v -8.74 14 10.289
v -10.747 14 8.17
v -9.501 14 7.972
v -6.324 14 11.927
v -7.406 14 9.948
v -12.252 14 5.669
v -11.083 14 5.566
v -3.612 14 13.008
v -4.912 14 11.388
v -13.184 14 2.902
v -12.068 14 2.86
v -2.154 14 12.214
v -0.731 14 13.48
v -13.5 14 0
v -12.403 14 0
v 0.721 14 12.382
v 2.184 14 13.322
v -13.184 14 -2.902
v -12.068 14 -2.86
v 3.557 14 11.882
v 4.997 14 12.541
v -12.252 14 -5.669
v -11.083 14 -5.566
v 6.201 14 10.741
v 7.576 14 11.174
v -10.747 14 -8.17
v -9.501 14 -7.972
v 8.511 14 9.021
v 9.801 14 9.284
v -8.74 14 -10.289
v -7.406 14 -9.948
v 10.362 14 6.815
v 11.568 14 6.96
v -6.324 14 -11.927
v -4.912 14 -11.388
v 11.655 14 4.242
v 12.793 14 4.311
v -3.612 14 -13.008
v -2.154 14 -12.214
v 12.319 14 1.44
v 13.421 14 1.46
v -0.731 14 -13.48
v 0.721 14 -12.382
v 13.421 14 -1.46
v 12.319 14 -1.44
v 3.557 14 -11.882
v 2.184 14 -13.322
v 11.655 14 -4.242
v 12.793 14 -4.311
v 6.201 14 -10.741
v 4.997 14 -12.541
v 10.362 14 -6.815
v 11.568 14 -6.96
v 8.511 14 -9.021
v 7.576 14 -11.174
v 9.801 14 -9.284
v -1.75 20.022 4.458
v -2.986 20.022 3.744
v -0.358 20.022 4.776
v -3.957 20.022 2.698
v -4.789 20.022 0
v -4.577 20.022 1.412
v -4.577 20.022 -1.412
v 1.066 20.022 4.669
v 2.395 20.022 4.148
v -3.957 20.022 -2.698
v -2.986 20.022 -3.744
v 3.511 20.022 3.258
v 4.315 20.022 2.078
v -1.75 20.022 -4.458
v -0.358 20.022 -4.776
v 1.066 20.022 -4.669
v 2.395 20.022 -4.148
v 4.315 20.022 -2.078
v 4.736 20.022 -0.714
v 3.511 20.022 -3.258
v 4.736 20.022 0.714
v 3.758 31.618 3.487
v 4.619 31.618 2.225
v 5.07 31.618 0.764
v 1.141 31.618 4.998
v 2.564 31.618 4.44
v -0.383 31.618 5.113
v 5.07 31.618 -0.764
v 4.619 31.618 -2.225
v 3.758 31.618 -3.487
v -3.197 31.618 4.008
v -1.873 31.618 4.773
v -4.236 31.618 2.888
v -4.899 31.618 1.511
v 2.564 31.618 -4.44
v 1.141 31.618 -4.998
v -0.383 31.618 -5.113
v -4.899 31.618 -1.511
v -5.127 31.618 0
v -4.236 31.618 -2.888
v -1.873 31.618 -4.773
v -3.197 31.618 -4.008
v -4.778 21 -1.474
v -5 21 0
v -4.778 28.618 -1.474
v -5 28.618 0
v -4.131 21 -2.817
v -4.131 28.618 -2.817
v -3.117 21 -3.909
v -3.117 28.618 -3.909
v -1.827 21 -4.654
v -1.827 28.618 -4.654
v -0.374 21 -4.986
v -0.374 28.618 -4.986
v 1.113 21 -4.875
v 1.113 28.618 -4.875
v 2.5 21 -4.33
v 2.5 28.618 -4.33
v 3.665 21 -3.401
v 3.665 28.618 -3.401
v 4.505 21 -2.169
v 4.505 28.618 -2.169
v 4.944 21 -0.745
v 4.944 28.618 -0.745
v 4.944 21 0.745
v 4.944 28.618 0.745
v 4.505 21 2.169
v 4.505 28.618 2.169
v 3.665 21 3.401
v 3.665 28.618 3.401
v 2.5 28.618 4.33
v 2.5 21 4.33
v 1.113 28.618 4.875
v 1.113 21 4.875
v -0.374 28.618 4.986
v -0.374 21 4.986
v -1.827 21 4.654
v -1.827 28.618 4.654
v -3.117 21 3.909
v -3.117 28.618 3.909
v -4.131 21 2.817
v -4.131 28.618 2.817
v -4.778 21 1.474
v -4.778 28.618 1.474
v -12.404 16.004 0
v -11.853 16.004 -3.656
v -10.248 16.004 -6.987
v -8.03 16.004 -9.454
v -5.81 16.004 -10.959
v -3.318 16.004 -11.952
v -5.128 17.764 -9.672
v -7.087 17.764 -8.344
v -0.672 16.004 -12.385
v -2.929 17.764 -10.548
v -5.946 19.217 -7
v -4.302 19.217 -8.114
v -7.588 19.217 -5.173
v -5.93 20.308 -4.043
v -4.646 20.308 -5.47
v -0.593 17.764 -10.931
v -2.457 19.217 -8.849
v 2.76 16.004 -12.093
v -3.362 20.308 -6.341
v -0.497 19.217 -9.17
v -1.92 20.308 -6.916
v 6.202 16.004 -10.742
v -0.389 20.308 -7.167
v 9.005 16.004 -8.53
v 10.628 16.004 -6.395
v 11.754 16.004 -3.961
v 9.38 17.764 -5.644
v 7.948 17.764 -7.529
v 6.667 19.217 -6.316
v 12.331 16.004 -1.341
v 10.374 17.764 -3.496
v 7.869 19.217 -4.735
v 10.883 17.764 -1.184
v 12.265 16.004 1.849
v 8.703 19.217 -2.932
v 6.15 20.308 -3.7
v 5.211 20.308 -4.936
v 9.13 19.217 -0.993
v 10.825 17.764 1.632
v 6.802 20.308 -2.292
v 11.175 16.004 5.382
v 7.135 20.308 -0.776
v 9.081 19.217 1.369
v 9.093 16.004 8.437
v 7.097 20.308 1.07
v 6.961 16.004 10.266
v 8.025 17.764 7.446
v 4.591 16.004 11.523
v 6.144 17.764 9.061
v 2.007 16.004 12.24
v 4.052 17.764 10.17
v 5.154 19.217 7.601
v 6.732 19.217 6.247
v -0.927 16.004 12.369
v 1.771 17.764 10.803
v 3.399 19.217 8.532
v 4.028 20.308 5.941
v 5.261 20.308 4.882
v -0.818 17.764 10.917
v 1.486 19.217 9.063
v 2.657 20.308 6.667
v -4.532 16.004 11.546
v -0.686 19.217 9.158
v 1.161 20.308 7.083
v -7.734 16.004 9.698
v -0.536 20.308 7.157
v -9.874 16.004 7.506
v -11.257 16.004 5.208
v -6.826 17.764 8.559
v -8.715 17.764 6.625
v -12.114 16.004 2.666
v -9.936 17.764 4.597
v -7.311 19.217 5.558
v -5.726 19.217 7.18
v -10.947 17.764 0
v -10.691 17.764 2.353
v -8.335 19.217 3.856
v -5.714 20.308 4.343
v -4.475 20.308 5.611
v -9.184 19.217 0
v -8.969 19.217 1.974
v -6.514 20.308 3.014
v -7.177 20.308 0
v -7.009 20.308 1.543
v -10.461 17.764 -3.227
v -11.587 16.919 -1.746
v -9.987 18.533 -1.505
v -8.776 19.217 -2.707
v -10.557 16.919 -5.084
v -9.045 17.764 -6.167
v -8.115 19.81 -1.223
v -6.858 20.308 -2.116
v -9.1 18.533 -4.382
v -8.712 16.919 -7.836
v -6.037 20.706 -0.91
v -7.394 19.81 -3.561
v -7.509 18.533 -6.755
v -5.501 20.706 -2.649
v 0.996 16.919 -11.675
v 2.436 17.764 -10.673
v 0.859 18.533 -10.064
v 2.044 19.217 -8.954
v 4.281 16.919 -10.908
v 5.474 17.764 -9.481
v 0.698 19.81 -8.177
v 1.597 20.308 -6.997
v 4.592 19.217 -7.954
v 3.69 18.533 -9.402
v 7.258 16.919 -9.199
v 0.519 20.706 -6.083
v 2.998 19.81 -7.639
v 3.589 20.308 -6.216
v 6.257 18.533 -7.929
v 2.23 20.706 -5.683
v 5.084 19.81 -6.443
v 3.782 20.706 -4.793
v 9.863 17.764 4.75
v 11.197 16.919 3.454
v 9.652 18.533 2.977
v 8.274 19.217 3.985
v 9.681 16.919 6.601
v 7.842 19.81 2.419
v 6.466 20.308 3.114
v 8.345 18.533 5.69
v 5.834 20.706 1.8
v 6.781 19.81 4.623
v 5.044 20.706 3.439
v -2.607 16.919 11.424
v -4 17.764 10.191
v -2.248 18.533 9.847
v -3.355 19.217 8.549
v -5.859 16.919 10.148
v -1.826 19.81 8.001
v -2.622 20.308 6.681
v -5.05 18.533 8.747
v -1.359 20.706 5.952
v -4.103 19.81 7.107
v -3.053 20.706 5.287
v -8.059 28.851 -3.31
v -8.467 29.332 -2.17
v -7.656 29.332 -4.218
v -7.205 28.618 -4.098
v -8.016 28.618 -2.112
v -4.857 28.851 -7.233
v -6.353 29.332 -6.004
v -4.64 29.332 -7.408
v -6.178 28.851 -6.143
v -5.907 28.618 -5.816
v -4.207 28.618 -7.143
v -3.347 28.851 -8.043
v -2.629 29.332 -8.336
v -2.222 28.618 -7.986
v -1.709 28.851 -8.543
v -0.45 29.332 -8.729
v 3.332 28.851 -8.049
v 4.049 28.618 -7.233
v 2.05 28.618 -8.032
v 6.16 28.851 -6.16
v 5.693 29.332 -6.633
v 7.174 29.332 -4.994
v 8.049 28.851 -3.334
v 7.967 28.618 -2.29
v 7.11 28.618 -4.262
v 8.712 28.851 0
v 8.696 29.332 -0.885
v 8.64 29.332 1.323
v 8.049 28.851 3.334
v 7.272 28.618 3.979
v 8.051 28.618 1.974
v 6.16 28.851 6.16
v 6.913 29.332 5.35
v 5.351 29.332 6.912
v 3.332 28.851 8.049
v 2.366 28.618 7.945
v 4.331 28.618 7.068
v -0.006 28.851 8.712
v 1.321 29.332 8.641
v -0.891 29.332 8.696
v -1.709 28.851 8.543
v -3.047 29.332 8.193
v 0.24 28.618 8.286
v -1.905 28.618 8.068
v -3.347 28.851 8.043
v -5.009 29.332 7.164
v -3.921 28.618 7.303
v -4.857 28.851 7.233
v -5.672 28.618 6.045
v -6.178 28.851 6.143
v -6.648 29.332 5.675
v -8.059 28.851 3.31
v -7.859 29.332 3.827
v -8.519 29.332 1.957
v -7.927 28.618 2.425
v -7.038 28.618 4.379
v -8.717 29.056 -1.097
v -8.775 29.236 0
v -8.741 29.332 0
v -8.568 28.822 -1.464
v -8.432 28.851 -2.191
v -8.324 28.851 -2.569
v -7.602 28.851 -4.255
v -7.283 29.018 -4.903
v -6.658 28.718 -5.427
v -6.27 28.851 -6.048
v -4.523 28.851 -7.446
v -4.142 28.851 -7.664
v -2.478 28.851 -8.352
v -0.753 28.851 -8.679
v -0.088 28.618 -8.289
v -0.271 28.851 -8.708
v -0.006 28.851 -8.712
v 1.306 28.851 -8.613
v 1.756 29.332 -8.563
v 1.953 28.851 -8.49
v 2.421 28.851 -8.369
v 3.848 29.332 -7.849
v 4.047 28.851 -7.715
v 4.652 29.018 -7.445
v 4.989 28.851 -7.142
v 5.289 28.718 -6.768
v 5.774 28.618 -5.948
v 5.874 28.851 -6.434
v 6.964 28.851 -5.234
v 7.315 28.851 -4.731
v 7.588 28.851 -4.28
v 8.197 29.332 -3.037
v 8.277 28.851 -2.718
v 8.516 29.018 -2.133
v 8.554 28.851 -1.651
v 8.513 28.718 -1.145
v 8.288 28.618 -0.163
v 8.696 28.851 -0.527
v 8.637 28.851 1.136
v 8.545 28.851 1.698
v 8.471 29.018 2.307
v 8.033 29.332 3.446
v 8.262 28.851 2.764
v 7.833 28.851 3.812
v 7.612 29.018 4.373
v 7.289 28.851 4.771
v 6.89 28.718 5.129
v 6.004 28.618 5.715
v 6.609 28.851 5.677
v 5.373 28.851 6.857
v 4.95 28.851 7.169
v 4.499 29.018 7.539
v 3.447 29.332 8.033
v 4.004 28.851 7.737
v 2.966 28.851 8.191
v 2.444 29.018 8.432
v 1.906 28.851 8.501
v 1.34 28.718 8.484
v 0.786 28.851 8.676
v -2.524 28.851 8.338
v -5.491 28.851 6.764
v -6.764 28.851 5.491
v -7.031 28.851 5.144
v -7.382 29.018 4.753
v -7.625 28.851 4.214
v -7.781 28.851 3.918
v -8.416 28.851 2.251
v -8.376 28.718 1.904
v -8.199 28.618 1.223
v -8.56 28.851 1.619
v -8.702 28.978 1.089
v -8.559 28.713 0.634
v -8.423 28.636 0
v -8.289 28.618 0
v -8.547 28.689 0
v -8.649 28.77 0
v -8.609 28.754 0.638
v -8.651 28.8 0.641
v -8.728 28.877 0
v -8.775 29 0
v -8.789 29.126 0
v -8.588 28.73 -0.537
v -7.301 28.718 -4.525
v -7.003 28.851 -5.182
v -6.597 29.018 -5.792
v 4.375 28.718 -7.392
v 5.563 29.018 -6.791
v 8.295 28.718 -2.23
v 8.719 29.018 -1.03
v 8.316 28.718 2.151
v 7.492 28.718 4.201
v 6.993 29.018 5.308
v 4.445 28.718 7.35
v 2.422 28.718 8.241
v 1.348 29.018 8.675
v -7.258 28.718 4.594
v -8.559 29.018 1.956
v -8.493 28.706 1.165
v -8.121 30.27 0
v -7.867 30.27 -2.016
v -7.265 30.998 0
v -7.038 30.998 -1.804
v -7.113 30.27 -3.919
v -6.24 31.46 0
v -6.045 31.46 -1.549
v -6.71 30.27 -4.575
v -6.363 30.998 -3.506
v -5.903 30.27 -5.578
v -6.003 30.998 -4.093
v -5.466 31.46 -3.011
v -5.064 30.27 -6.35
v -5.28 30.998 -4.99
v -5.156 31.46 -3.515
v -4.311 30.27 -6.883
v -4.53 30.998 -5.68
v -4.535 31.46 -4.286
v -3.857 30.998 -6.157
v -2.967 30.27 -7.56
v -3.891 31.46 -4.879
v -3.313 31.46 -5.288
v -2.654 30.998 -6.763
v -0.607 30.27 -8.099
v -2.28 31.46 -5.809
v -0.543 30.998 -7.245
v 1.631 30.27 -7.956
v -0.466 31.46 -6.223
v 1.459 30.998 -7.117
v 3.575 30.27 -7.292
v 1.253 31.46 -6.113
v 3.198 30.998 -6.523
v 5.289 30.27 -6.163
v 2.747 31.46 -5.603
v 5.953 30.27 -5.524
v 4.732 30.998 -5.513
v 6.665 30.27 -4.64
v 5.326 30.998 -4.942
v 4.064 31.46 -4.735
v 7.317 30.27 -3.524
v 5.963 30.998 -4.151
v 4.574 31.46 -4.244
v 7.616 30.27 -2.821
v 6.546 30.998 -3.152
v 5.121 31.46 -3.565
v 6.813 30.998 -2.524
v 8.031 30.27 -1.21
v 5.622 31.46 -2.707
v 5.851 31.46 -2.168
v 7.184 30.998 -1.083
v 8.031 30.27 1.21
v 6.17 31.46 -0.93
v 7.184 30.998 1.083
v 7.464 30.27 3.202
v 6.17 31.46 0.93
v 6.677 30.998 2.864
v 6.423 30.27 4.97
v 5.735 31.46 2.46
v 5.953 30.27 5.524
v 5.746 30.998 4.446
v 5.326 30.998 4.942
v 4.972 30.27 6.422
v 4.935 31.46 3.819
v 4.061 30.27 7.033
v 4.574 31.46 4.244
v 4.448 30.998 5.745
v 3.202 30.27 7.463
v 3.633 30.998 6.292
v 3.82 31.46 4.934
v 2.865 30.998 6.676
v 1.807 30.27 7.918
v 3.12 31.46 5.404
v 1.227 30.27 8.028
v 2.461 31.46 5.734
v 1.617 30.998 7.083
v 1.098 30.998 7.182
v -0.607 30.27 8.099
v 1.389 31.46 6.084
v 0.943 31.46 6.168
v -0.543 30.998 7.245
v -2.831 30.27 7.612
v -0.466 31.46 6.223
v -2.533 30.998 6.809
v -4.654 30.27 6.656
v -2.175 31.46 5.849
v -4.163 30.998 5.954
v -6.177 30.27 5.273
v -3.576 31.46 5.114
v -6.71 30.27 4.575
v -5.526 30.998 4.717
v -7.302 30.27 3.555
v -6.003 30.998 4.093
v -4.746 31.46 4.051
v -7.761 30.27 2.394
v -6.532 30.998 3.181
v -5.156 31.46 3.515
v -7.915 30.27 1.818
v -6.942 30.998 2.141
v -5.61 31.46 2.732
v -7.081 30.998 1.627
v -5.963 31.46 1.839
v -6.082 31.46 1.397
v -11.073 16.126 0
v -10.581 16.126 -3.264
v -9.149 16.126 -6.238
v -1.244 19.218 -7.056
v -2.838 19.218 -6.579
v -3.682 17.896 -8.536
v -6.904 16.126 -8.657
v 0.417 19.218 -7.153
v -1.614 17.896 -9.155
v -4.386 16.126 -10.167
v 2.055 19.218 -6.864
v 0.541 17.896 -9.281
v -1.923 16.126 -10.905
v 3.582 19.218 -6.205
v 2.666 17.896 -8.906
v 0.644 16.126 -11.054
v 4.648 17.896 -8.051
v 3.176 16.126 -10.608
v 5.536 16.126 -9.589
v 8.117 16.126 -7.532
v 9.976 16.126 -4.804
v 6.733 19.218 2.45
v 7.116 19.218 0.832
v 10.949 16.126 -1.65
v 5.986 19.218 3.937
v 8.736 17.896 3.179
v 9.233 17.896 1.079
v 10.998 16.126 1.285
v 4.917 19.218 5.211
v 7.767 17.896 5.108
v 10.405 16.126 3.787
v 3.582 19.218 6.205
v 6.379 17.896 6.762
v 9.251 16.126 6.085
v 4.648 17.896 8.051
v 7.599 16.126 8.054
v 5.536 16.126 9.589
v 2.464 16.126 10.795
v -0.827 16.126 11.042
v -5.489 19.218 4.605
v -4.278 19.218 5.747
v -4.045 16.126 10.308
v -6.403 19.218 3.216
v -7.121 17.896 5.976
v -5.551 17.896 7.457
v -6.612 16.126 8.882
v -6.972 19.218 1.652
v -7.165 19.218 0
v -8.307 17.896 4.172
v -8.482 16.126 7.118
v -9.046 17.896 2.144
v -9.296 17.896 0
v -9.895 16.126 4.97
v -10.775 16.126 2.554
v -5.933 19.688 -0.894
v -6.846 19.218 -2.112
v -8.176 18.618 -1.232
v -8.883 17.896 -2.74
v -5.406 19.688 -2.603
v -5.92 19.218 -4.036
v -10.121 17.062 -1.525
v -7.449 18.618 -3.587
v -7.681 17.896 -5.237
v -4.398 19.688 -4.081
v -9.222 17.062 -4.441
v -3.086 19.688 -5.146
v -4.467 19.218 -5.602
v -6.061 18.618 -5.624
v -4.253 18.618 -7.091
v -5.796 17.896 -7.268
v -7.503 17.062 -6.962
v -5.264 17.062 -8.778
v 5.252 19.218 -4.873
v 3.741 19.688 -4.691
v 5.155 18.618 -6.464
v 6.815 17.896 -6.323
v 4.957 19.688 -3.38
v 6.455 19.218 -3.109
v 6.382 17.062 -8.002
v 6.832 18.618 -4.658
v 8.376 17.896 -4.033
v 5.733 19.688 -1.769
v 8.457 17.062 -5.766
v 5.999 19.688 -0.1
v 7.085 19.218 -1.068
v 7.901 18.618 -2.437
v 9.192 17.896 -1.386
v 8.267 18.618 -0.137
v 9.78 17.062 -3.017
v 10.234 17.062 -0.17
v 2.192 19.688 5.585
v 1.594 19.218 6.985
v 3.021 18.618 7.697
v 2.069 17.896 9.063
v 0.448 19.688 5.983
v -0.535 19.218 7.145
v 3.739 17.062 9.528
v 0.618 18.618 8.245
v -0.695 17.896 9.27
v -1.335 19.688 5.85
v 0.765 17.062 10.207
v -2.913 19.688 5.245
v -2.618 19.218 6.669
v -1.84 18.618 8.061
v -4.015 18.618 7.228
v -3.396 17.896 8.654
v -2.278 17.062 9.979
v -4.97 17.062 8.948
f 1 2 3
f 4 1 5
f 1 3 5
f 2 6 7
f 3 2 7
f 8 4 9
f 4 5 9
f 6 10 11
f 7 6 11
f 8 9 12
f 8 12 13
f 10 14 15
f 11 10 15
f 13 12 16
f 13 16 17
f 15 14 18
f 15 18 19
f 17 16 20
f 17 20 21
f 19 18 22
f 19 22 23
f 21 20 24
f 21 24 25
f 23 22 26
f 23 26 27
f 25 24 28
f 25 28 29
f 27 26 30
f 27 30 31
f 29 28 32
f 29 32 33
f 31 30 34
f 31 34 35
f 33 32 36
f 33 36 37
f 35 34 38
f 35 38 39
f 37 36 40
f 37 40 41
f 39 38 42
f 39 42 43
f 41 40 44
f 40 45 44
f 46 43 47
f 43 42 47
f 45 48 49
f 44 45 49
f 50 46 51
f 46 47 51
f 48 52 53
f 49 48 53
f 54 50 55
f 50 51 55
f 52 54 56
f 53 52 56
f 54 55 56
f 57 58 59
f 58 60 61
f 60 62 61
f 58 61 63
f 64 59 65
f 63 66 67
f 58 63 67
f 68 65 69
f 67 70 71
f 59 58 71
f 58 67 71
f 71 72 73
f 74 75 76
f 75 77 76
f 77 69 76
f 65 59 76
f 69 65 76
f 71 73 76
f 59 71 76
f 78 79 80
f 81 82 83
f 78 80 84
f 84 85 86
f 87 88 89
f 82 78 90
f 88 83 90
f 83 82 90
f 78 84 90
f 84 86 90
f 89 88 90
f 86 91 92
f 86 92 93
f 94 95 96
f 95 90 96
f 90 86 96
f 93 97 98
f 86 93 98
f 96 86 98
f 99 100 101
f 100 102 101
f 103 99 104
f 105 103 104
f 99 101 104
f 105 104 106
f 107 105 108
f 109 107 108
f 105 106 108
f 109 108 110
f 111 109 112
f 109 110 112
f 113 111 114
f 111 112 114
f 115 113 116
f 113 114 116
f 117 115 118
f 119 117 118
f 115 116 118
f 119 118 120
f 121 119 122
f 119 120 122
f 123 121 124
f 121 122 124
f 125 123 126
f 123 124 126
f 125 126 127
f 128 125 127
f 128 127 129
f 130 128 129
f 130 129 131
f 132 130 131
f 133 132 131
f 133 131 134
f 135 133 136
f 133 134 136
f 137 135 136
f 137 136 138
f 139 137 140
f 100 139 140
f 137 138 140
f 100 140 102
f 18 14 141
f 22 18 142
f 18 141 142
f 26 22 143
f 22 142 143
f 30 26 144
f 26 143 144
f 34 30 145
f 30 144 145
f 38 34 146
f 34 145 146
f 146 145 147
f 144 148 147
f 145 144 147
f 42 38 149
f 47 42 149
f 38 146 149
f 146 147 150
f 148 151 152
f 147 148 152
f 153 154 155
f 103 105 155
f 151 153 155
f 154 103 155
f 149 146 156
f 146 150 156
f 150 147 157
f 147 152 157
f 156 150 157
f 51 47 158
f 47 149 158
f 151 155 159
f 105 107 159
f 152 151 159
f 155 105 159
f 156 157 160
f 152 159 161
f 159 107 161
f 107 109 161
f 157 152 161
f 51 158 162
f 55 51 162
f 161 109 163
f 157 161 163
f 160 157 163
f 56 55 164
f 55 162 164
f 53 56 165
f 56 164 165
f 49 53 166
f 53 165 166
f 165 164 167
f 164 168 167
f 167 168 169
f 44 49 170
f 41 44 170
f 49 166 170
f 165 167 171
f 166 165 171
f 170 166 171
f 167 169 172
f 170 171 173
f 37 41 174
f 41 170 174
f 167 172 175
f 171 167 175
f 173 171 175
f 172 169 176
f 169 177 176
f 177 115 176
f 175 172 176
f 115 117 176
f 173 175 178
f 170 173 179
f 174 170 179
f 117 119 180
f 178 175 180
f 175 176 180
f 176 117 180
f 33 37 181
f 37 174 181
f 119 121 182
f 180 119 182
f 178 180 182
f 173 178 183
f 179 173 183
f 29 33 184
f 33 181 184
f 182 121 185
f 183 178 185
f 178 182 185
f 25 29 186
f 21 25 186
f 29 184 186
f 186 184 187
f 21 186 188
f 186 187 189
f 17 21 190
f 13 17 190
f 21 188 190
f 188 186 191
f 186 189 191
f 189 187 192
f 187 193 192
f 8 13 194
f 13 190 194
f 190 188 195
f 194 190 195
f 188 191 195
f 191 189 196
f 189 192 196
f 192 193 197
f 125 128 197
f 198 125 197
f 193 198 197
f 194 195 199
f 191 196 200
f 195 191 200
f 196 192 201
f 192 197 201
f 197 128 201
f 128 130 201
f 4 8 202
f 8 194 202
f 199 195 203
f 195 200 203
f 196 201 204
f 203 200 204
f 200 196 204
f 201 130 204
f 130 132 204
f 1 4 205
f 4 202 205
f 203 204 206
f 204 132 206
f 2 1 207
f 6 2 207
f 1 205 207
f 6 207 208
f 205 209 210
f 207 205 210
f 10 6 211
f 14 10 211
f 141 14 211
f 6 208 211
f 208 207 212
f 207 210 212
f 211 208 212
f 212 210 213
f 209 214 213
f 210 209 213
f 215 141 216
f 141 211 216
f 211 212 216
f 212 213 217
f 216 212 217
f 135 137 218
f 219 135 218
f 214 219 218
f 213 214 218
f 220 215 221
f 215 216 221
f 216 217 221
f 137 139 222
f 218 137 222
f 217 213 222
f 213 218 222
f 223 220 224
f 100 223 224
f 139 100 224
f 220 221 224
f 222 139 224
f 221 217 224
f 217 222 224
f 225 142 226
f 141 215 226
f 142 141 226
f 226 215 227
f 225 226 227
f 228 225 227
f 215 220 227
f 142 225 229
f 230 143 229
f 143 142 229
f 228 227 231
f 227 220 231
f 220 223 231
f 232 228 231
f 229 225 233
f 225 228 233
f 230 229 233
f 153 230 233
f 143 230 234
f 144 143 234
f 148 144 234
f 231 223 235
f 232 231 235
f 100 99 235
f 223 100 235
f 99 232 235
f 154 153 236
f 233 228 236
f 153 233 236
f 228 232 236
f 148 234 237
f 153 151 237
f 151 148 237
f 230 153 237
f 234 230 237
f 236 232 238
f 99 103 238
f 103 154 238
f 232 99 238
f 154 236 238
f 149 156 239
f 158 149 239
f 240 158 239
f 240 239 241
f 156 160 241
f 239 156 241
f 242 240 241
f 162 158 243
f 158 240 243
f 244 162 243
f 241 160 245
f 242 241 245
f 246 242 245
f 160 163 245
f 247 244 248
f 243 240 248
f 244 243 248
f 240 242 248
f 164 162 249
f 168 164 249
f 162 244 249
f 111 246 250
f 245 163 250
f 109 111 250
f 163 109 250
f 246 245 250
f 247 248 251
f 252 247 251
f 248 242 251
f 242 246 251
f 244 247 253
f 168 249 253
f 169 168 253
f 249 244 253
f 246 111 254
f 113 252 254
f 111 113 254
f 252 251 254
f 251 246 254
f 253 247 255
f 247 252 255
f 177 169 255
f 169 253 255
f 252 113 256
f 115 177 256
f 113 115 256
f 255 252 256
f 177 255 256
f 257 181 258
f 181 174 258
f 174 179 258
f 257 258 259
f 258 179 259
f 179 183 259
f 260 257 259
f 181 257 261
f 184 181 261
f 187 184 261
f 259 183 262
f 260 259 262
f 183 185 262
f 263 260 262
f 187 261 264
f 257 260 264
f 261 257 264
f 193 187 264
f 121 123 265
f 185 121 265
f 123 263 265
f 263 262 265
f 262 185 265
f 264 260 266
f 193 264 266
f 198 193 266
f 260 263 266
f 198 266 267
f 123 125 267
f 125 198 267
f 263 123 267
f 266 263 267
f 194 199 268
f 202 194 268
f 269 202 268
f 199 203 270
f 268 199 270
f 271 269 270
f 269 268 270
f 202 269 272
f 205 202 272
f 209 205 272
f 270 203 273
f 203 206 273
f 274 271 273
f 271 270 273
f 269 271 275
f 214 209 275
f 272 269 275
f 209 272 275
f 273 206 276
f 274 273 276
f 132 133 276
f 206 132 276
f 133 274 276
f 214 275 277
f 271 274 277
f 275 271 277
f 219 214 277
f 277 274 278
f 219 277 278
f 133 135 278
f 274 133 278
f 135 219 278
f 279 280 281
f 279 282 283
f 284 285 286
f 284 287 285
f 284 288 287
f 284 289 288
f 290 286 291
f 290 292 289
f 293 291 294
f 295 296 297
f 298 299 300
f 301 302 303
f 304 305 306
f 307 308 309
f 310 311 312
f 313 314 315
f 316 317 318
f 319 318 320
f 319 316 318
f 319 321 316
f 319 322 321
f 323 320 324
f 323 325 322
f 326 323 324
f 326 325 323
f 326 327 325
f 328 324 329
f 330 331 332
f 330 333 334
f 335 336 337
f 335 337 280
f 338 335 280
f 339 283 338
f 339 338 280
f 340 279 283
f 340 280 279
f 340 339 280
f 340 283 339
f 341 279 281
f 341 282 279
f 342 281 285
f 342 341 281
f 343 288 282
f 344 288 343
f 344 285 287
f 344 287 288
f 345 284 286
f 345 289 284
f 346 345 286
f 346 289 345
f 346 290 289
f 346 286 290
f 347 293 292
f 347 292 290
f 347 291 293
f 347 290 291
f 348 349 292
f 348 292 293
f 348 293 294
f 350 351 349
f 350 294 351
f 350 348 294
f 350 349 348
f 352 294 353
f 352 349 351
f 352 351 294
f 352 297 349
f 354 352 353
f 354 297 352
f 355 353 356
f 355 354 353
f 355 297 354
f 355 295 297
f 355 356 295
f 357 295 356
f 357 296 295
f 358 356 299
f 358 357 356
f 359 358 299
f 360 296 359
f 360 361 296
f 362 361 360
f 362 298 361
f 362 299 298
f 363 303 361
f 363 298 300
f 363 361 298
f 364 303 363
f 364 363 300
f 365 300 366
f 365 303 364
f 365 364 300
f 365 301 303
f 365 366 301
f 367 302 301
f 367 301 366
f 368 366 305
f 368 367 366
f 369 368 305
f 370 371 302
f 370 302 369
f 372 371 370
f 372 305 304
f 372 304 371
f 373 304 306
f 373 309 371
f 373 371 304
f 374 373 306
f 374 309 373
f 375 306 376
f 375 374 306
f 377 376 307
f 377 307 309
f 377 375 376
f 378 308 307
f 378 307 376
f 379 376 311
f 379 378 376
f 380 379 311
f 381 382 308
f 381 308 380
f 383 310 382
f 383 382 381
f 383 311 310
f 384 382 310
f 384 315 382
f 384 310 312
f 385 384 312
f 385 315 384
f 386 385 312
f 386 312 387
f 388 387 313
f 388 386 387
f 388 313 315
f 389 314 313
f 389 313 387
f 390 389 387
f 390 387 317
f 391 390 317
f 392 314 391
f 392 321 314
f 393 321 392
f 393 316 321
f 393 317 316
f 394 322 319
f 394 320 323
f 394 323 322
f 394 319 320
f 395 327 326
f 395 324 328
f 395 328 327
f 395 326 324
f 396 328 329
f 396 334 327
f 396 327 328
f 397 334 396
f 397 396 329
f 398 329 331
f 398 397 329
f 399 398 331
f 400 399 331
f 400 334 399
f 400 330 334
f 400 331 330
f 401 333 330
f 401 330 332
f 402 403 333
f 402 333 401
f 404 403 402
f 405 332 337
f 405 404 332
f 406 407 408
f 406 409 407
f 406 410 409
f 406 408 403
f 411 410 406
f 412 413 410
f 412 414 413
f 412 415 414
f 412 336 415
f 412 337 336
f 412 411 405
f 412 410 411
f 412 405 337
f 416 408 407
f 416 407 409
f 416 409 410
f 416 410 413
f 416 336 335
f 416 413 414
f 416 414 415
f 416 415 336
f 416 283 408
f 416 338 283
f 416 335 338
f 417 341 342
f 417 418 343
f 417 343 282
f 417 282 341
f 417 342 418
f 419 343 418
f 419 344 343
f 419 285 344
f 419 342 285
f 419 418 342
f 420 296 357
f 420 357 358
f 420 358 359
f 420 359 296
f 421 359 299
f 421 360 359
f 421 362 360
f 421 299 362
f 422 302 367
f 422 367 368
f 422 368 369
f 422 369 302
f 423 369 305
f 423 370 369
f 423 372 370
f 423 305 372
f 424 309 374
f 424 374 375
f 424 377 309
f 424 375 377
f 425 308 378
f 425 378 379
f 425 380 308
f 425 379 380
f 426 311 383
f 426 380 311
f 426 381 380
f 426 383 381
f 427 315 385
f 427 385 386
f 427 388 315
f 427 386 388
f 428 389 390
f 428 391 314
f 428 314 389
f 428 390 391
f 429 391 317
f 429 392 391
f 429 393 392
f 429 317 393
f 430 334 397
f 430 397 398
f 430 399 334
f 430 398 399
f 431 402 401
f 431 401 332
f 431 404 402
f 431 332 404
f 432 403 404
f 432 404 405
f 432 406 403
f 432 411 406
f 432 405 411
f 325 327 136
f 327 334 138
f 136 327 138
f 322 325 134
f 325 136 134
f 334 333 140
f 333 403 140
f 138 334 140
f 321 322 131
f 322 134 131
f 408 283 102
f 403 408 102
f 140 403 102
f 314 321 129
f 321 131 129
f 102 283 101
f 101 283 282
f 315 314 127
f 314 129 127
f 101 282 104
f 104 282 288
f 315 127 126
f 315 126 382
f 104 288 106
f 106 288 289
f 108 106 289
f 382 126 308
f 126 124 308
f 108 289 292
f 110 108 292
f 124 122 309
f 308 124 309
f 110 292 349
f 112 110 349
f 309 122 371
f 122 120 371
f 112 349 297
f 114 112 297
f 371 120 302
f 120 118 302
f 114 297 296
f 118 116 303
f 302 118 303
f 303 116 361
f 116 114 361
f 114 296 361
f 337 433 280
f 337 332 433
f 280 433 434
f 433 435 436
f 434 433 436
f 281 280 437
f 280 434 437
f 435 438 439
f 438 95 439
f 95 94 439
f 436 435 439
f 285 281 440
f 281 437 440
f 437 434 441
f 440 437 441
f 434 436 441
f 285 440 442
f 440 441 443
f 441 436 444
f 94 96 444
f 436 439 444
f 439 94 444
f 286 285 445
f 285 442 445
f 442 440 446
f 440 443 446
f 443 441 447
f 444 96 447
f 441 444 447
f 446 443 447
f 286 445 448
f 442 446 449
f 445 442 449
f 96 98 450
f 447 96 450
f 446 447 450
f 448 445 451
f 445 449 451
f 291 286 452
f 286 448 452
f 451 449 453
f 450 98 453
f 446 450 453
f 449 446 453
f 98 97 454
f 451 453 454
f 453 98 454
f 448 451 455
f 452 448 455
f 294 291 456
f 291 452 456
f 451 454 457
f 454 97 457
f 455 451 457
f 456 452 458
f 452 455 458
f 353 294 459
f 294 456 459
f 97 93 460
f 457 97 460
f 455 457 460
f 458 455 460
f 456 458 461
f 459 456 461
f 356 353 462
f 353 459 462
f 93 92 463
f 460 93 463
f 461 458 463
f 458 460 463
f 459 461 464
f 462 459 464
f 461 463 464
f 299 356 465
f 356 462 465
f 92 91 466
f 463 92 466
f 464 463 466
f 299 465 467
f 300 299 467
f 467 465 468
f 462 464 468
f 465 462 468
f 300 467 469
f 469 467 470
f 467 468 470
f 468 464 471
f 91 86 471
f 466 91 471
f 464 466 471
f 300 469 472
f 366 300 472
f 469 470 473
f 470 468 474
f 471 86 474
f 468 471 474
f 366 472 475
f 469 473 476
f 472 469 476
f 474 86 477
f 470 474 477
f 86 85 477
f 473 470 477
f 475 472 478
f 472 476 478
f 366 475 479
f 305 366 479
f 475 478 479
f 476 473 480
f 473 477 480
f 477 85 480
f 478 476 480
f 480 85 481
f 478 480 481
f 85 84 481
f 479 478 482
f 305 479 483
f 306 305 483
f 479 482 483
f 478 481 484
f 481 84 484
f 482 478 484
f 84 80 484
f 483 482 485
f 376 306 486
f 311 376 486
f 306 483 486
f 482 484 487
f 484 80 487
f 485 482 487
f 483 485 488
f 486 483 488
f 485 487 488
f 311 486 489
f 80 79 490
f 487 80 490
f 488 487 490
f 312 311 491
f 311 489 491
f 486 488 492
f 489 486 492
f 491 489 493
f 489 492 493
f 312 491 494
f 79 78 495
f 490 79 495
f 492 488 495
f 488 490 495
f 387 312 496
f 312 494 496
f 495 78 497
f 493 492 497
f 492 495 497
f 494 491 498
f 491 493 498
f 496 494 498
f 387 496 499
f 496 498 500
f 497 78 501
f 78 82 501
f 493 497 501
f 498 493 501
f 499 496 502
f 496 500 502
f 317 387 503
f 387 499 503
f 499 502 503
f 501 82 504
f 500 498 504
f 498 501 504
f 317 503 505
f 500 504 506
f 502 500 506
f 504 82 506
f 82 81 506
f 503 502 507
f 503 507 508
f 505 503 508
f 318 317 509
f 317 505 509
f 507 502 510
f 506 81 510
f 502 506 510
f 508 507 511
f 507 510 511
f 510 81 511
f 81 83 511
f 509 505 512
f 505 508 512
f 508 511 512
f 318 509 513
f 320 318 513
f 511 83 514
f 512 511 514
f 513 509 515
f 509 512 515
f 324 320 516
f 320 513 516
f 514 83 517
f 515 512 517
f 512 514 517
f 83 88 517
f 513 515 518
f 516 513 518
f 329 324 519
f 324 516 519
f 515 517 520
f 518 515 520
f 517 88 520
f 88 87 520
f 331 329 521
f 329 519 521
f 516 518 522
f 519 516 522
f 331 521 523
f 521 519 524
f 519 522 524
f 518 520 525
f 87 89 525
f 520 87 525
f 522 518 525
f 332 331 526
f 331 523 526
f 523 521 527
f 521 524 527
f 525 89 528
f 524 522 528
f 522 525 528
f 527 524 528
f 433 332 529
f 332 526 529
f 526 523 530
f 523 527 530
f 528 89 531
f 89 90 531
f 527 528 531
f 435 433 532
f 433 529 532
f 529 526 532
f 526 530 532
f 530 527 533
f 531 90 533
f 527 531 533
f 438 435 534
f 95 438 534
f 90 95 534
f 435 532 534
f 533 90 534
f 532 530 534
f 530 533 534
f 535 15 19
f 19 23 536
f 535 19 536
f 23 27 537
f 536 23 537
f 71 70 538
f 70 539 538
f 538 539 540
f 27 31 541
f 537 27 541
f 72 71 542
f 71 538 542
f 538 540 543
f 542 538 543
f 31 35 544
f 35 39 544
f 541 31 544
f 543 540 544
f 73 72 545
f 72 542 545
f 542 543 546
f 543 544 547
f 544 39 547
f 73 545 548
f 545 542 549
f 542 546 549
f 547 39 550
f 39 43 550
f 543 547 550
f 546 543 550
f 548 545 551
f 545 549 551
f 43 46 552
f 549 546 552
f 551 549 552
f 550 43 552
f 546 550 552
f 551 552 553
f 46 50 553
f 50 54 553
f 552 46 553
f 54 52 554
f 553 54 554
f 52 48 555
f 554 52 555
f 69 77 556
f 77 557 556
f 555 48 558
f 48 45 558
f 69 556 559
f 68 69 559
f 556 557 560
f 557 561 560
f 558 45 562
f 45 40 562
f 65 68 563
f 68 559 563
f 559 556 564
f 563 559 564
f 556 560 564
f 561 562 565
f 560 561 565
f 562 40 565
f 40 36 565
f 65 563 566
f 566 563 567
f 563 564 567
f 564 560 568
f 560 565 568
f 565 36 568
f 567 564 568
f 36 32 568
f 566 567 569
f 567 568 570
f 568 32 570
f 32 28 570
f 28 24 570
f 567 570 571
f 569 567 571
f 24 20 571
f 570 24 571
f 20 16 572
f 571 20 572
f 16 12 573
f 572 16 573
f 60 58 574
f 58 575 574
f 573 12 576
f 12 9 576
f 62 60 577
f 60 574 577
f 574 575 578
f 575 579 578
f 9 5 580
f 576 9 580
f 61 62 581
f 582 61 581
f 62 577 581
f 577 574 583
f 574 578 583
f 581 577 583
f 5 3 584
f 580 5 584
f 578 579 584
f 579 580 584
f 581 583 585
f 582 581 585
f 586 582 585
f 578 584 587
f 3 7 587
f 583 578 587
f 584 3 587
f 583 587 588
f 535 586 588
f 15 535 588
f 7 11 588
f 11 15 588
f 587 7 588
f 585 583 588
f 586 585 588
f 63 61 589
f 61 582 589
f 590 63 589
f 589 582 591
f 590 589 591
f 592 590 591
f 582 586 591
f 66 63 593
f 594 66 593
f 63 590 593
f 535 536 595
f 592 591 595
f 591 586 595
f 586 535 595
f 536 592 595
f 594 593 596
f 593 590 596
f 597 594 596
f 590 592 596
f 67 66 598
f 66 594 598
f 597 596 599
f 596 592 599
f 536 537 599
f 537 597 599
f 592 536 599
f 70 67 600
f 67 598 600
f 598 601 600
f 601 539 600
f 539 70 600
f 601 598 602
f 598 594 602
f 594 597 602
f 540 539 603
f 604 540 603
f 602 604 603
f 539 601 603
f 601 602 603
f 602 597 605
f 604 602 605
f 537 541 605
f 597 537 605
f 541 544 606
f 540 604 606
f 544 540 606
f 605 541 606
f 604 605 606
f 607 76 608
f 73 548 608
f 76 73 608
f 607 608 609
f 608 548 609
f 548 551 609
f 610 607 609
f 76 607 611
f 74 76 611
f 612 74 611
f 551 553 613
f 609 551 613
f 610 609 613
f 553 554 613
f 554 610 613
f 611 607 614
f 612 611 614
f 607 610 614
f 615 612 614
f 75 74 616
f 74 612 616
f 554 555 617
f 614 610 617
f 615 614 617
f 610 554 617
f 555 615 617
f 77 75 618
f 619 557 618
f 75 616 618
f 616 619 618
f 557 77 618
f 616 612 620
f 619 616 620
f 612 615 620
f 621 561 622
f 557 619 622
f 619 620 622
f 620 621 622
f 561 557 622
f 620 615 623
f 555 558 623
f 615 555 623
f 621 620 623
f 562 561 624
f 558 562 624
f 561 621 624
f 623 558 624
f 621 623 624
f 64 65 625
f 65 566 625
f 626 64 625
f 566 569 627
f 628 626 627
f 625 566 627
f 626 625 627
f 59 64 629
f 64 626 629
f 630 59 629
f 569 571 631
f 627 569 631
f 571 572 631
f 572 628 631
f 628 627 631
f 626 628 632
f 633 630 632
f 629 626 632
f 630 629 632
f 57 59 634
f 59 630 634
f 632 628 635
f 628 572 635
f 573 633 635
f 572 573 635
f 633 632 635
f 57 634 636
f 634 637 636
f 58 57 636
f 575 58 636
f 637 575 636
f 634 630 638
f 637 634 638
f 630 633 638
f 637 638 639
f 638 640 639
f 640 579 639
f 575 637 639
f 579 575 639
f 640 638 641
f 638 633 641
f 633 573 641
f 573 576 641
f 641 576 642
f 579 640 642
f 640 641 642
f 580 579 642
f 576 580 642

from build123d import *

# Parameters (mm, degrees)
FILLET1_R = 0.5


with BuildPart() as part:
    # Sketch1 → Revolve1 (revolve)
    with BuildSketch(Plane.XY):
        with BuildLine():
            Line((0, 31.617857892), (0, 20.022445397))
            Line((0, 20.022445397), (-4.789317778, 20.022445397))
            ThreePointArc((-4.789317778, 20.022445397), (-9.296235454, 17.896468434), (-12.402618998, 14))
            Line((-12.402618998, 14), (-13.5, 14))
            ThreePointArc((-13.5, 14), (-10.100300372, 18.532507594), (-5, 21))
            Line((-5, 21), (-5, 28.617857892))
            Line((-5, 28.617857892), (-9, 28.617857892))
            ThreePointArc((-9, 28.617857892), (-7.576506397, 30.780135552), (-5.127016654, 31.617857892))
            Line((-5.127016654, 31.617857892), (0, 31.617857892))
        make_face()
    revolve(axis=Axis((0, 31.617857892, 0), (0, -1, 0)))

    # Fillet1
    fillet1_edges = [part.edges().sort_by_distance(p)[0] for p in [
        (9, 28.617857892, 0),
    ]]
    fillet(fillet1_edges, radius=FILLET1_R)


solid = part.part
